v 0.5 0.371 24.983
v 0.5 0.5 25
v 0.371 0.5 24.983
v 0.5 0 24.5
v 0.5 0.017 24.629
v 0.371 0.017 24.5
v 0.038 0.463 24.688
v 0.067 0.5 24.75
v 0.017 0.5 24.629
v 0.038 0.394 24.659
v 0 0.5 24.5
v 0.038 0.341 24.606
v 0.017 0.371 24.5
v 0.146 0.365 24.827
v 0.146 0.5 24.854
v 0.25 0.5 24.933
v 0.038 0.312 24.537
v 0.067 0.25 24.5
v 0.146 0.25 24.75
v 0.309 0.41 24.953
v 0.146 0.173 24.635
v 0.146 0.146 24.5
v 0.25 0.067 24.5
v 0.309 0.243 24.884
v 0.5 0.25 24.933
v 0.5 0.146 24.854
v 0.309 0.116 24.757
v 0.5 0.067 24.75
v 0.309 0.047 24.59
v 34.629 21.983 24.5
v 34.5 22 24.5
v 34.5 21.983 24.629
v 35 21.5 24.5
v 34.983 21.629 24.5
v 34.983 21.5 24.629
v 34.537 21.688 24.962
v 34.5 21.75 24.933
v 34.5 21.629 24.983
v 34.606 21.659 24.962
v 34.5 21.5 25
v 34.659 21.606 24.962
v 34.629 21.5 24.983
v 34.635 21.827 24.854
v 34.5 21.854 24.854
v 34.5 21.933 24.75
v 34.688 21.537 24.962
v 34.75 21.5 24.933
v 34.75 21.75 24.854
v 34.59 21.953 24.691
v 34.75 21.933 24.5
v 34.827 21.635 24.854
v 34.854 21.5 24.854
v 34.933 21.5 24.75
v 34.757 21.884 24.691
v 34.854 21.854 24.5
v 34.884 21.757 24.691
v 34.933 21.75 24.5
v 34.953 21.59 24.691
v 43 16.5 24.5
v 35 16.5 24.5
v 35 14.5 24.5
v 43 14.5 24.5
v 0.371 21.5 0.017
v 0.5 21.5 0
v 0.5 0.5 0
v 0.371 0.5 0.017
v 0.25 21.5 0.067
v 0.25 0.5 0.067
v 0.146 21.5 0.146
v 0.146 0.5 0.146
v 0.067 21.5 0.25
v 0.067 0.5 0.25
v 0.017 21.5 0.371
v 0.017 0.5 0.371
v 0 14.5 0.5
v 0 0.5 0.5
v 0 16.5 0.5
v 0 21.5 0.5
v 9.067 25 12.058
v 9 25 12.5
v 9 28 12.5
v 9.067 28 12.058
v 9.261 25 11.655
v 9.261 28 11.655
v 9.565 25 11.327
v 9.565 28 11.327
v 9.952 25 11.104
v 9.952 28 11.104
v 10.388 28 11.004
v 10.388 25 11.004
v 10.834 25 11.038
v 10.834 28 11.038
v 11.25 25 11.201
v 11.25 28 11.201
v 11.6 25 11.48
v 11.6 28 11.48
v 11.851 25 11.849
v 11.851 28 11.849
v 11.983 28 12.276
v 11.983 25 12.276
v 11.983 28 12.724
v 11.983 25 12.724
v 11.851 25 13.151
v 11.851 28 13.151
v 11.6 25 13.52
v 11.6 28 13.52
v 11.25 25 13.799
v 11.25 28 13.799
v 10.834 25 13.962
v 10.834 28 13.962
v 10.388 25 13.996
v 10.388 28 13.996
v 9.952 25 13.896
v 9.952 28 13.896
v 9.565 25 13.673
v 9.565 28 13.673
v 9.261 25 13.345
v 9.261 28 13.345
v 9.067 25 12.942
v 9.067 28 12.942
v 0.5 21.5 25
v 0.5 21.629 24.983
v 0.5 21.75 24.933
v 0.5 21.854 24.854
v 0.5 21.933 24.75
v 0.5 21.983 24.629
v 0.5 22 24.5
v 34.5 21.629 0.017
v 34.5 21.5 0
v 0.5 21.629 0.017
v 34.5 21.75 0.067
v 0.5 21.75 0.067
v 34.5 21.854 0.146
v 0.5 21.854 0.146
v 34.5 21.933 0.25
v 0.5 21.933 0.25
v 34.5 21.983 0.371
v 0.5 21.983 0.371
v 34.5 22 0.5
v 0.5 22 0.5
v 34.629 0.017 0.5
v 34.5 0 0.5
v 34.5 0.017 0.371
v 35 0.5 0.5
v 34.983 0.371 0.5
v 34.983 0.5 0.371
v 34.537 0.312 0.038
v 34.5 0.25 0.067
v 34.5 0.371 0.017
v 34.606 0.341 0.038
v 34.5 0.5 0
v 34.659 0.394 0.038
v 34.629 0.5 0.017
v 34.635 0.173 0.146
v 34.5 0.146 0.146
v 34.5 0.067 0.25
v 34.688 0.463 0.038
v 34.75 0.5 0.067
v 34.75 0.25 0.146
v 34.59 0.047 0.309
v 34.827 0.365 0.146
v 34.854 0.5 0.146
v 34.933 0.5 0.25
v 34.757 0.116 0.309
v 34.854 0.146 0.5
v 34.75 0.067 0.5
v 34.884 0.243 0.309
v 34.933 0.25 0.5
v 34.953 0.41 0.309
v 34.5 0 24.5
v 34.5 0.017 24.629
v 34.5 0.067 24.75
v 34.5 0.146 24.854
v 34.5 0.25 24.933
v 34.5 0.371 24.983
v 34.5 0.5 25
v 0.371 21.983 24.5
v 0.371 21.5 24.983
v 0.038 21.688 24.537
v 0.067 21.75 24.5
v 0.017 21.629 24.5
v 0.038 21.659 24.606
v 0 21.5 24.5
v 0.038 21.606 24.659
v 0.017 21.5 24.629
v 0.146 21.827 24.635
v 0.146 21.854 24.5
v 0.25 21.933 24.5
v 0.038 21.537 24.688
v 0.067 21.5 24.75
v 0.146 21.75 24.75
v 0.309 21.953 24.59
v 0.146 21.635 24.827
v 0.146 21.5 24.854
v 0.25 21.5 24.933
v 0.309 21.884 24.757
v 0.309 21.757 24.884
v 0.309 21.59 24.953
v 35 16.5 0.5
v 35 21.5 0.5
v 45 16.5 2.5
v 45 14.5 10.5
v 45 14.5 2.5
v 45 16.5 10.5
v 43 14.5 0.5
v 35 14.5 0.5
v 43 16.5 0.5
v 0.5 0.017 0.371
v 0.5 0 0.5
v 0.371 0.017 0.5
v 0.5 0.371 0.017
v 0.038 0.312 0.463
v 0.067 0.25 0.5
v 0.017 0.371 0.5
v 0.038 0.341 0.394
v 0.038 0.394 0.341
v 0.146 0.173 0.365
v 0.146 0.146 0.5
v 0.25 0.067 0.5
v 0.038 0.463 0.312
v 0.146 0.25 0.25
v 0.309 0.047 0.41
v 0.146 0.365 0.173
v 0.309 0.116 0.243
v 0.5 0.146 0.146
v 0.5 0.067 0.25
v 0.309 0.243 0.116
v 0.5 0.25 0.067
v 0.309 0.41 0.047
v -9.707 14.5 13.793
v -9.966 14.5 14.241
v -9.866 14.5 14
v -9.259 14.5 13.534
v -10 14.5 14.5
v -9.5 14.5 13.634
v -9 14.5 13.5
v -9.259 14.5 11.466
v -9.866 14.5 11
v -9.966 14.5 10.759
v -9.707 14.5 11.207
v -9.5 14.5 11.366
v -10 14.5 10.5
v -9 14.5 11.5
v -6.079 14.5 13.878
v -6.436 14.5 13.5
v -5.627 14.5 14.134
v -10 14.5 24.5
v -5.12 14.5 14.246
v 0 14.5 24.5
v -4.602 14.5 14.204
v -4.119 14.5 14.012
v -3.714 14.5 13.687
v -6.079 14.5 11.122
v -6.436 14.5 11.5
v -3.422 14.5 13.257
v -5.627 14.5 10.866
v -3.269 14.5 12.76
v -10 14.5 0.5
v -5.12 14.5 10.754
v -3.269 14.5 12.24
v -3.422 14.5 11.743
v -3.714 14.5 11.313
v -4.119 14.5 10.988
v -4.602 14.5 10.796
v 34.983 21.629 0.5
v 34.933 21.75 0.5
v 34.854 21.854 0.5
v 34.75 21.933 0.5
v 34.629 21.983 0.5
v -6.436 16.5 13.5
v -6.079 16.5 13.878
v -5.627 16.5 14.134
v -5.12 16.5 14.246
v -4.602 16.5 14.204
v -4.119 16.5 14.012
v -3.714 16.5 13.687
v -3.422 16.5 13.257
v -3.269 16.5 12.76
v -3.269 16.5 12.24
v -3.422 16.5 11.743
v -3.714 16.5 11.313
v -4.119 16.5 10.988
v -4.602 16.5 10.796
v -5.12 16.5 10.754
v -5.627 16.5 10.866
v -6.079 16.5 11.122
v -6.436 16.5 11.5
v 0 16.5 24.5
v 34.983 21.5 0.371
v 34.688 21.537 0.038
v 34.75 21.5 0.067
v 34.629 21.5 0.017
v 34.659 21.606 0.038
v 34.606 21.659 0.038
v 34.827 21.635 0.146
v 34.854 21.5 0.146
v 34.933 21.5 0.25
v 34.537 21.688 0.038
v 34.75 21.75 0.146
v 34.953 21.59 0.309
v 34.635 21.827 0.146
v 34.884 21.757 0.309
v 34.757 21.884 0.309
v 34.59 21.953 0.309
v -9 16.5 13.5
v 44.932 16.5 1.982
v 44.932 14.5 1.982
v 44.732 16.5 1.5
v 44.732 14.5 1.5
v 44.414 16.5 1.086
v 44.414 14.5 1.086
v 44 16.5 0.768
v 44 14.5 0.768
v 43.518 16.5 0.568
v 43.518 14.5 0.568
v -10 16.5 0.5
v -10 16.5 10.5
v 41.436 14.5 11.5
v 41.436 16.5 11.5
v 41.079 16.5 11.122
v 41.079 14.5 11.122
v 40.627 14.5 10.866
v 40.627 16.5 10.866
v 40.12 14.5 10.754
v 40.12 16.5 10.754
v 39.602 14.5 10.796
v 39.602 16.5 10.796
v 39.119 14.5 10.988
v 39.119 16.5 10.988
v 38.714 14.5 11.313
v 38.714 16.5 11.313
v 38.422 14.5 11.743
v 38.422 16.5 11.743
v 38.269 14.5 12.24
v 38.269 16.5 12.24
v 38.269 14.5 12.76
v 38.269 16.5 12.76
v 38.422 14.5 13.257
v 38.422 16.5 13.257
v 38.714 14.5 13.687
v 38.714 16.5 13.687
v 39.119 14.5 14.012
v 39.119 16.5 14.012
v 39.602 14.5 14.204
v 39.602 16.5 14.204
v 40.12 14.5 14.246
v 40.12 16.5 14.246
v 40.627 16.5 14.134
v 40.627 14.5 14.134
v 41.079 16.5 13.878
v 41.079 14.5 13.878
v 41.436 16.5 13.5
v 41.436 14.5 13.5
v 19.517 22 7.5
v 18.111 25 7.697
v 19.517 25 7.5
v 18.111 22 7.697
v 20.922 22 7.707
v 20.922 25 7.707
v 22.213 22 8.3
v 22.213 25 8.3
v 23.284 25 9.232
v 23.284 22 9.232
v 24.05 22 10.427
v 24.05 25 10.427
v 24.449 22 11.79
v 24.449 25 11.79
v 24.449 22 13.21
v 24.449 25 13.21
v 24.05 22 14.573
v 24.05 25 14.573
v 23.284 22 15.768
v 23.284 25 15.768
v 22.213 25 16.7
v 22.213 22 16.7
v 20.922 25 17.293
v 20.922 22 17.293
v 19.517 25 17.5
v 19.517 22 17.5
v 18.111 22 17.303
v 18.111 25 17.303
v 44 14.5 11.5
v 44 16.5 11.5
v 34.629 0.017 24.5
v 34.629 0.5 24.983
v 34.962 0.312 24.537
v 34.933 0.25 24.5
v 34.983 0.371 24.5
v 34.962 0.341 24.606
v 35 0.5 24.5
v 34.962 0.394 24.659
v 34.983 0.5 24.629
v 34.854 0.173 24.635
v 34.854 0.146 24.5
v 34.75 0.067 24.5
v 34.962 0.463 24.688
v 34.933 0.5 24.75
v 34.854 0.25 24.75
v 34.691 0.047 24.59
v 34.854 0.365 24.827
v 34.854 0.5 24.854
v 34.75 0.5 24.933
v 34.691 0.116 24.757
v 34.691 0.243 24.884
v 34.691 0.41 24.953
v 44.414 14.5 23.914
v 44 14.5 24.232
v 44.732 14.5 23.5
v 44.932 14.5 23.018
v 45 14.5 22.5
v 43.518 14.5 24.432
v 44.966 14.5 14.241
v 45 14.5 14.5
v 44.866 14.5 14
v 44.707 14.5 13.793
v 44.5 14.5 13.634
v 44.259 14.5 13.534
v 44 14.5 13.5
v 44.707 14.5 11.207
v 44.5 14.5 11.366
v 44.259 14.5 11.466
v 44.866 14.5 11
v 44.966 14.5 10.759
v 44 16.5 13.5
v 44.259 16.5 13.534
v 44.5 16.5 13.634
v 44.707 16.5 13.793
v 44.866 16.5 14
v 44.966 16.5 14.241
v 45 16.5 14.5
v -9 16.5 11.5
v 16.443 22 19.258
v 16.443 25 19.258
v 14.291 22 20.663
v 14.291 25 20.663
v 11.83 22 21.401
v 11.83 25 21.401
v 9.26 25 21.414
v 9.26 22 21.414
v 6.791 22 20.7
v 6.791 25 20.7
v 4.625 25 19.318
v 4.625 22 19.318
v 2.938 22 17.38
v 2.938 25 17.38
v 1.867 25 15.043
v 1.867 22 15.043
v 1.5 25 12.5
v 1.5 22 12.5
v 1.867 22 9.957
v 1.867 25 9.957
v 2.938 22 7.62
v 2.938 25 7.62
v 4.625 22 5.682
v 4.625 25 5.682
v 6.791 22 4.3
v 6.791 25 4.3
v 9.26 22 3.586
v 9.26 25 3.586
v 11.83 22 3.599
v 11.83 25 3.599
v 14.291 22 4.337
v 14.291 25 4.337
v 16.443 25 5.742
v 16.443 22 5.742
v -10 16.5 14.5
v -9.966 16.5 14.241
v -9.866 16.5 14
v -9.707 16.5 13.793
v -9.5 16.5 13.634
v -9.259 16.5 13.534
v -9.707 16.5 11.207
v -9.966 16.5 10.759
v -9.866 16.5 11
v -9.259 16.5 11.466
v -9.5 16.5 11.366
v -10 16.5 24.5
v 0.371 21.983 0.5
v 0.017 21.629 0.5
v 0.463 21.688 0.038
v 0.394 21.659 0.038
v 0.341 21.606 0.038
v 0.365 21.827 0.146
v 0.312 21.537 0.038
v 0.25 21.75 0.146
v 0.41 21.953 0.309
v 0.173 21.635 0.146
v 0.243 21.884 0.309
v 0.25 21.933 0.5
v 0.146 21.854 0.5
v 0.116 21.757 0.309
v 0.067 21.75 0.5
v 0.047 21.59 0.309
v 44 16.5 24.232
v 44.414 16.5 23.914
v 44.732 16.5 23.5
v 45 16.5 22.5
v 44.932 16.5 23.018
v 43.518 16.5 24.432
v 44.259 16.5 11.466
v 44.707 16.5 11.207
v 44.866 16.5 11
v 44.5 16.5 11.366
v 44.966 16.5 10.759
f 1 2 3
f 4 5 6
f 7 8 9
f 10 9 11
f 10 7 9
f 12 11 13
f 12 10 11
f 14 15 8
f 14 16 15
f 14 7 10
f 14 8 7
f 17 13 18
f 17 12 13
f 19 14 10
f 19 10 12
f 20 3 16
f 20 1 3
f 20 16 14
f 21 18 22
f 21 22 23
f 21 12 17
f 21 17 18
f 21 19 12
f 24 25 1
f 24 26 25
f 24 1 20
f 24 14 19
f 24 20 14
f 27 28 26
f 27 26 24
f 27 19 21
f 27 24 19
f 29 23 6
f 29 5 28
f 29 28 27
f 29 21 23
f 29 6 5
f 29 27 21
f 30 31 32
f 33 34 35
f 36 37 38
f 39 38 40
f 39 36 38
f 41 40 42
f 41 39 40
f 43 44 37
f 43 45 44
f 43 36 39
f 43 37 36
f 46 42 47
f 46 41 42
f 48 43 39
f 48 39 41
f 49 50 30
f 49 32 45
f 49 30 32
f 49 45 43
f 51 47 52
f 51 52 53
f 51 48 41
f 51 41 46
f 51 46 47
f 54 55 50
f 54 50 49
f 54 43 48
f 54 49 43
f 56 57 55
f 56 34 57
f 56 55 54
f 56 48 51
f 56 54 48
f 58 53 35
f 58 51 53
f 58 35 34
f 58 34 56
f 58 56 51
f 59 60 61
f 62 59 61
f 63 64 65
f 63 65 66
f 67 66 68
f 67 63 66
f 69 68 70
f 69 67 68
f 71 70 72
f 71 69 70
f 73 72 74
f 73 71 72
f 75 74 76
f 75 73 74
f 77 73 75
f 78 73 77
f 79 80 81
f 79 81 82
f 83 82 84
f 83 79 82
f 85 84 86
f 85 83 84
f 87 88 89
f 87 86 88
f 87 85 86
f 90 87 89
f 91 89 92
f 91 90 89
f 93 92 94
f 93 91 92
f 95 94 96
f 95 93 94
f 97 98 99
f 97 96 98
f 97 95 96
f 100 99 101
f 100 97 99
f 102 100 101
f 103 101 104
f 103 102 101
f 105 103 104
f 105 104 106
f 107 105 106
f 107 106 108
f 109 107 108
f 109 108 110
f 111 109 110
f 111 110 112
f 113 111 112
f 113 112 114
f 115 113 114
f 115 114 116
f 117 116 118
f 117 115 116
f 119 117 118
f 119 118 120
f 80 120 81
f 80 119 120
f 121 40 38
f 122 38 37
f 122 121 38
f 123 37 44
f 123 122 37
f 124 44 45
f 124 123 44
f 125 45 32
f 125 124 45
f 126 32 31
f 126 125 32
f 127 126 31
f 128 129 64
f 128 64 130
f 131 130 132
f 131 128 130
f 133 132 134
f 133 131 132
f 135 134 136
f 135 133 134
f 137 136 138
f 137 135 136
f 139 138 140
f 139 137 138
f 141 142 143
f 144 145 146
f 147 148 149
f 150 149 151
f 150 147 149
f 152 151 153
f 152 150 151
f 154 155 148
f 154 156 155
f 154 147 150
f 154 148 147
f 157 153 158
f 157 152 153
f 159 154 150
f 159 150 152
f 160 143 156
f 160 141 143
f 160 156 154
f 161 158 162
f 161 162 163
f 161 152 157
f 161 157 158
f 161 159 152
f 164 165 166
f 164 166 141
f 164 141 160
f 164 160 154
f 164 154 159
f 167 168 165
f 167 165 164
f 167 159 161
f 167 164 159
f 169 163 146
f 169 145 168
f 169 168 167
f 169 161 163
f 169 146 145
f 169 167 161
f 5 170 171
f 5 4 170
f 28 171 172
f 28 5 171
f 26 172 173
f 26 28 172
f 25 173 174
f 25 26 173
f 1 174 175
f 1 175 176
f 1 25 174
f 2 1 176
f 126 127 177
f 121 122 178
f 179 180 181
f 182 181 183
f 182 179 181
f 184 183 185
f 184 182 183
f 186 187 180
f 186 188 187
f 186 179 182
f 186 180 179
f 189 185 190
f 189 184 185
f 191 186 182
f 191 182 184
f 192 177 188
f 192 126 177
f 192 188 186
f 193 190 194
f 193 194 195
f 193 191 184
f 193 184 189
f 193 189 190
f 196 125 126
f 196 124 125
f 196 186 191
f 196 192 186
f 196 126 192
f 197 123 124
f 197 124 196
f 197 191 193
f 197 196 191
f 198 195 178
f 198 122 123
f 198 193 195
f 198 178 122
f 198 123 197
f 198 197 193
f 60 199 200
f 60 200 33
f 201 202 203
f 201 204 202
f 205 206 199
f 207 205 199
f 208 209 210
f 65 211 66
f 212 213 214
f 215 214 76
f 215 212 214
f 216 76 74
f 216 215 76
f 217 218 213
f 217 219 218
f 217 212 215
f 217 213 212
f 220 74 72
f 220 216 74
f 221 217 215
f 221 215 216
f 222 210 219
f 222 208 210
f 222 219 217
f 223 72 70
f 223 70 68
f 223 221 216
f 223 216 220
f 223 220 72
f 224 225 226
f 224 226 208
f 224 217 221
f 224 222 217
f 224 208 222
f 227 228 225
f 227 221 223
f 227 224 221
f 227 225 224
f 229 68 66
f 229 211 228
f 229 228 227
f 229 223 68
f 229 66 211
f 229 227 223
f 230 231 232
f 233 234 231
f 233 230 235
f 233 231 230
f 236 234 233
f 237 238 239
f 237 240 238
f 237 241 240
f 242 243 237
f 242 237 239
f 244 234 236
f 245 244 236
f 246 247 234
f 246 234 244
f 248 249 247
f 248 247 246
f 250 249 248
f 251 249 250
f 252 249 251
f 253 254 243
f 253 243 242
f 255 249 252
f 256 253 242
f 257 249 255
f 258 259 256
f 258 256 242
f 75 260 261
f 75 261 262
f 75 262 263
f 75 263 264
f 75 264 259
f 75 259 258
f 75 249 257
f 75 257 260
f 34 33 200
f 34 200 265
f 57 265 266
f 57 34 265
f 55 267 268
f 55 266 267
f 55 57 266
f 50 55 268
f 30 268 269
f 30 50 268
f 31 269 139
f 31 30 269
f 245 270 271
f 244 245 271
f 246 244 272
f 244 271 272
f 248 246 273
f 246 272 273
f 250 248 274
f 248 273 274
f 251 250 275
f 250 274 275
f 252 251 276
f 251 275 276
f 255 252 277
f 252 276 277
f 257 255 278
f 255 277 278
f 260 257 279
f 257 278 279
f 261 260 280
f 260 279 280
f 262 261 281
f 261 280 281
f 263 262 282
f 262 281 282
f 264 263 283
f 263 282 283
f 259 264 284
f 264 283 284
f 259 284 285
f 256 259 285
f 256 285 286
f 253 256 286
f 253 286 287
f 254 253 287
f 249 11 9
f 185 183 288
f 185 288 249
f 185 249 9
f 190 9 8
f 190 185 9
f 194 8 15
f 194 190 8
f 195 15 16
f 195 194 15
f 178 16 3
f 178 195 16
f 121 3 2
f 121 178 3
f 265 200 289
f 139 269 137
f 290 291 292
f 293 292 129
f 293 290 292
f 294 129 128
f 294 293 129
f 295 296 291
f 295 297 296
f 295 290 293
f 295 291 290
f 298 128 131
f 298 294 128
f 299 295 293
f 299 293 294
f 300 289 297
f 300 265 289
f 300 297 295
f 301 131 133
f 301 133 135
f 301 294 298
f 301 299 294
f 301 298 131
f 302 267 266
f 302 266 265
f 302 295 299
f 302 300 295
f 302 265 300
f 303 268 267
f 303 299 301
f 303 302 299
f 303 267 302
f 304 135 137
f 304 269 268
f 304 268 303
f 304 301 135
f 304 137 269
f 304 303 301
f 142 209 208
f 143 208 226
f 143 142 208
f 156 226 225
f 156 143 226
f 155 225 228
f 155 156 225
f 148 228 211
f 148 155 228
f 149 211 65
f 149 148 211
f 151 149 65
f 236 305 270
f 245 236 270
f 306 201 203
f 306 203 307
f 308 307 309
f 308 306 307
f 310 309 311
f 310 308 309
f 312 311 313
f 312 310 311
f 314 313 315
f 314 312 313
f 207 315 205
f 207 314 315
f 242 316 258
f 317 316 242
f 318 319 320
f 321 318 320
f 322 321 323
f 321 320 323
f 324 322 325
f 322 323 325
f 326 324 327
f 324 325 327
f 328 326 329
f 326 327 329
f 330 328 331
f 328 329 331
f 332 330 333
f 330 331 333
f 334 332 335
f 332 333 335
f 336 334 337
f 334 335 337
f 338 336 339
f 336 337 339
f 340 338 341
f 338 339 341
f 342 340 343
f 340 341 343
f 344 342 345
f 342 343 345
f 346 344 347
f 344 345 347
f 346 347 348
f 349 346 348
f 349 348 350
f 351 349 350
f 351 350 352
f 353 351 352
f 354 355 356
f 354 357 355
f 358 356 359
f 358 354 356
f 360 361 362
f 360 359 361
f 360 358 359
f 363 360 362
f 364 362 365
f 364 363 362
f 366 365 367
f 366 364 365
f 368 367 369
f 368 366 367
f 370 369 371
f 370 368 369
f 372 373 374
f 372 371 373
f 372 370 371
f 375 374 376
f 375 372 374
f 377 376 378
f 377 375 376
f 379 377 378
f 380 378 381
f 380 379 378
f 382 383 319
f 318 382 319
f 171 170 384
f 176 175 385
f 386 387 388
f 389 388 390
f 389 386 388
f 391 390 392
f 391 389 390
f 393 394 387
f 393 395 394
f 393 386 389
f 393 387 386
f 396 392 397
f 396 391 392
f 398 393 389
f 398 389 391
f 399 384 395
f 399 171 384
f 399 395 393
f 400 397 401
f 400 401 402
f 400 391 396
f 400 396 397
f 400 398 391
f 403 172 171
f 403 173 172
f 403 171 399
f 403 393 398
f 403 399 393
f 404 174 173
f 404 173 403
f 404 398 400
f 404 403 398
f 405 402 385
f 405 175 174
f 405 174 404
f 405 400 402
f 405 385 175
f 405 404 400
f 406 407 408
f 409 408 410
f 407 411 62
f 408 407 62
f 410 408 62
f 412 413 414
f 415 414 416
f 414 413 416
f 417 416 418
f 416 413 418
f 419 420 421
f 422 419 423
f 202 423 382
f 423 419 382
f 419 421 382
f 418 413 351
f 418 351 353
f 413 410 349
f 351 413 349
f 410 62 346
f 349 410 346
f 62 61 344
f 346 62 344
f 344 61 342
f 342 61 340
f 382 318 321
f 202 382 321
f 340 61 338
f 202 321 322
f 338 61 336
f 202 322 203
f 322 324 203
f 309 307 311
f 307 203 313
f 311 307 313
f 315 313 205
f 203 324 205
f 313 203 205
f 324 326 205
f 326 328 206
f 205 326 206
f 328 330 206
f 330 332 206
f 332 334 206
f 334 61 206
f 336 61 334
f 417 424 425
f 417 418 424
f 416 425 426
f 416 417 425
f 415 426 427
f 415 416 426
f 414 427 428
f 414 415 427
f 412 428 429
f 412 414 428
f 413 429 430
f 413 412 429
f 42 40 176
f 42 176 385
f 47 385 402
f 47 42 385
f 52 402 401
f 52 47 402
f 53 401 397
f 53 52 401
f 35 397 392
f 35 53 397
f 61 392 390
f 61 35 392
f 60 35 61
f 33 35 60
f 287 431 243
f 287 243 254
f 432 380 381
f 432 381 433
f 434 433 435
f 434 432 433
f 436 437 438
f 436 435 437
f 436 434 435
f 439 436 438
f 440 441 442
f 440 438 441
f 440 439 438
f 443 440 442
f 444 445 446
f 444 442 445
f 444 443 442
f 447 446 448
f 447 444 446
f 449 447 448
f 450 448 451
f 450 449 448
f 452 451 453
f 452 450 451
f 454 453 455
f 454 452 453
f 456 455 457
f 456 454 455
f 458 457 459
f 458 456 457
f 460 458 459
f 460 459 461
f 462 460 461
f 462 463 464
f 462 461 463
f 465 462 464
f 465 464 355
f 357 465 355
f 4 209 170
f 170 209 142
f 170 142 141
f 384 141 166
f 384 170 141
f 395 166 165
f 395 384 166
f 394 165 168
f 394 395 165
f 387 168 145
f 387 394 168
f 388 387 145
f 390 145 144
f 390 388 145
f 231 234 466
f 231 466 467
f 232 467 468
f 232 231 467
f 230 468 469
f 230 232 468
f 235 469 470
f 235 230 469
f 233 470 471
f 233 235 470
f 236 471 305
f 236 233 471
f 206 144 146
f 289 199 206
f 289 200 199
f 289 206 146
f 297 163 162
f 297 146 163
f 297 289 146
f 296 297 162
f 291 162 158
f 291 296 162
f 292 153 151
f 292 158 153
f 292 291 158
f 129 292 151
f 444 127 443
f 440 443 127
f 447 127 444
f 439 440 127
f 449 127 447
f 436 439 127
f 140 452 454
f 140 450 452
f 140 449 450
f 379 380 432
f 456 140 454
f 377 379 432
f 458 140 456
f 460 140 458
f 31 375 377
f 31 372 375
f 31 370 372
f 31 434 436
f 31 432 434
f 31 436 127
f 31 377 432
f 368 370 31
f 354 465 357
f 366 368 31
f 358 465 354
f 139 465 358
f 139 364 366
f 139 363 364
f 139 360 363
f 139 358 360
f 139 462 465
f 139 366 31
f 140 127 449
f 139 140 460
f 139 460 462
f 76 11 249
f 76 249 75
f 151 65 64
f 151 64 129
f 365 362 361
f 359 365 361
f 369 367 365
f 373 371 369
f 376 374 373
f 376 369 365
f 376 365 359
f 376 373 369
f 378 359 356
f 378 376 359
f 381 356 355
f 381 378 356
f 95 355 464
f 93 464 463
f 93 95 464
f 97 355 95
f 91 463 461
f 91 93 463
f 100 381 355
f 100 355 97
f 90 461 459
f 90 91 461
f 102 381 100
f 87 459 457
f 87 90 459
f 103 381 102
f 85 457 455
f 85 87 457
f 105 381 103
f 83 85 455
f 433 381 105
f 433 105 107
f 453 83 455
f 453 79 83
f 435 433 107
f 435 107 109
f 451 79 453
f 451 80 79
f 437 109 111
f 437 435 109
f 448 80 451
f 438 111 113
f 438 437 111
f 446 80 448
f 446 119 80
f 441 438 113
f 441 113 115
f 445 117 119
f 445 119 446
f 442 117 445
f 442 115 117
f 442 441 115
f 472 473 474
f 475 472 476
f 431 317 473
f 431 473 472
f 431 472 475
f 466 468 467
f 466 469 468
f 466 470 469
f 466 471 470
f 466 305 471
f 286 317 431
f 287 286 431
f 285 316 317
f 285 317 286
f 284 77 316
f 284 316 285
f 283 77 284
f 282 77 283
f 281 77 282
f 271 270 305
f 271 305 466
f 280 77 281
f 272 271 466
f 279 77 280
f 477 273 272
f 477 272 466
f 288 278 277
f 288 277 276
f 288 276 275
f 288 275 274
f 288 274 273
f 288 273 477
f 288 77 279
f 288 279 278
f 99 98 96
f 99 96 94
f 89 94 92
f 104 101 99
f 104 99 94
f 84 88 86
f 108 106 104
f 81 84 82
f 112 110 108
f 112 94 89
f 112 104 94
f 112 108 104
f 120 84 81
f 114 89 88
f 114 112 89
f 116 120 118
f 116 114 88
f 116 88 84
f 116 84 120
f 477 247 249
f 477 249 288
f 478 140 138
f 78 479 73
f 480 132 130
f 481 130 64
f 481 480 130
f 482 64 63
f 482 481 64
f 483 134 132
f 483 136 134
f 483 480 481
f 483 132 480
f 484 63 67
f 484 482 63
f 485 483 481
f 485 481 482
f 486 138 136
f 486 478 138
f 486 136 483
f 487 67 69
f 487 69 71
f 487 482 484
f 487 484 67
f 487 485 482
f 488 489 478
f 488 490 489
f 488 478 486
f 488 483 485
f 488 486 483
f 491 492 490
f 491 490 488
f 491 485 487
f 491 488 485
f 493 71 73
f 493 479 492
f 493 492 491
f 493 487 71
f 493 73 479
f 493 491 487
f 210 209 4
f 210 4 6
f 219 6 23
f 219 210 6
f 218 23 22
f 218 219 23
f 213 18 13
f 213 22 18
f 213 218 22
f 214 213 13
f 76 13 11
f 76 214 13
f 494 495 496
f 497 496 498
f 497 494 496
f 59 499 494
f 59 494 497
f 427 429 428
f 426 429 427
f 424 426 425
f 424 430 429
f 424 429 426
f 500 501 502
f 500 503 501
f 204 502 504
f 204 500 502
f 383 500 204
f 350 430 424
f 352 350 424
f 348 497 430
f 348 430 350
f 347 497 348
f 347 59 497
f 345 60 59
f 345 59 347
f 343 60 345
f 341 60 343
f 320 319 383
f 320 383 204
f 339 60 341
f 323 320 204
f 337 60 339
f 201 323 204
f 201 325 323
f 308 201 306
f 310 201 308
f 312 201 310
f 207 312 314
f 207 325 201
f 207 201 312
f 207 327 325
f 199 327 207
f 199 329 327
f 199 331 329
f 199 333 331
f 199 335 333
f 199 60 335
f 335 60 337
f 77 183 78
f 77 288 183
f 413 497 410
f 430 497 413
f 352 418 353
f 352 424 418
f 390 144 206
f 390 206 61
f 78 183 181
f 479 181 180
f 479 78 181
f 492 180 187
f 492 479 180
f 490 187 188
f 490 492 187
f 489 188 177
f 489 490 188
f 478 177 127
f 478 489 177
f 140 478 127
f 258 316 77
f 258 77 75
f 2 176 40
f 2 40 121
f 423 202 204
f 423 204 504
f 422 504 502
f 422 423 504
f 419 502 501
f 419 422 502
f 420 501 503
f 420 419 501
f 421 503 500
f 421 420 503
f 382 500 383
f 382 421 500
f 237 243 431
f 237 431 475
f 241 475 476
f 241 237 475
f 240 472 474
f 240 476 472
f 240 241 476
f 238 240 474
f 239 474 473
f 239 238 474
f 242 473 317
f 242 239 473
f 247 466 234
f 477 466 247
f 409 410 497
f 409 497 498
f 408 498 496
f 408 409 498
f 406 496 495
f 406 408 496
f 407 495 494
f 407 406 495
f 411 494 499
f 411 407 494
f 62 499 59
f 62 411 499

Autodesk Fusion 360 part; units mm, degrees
sketch "Sketch1" plane through (0, 0, 0) normal (0, 1, 0) x (1, 0, 0)
  line L0 (0, 0) -> (35, 0)
  line L1 (35, 0) -> (35, -25)
  line L2 (35, -25) -> (0, -25)
  line L3 (0, -25) -> (0, 0)
  dimension "d1" = 35
  dimension "d2" = 25
extrude "Extrude1" add sketch "Sketch1" along normal blind 22 makes body 1
fillet "Fillet1" radius 0.5 12 edges at (35, 22, 12.5) (17.5, 22, 25) (0, 22, 12.5) (17.5, 22, 0) (17.5, 0, 25) (35, 0, 12.5) (35, 11, 0) (35, 11, 25) (17.5, 0, 0) (0, 11, 0) (0, 11, 25) (0, 0, 12.5) on bodies 1
sketch "Sketch2" plane through (0, 22, 0) normal (0, 1, 0) x (-1, 0, 0)
  line L0 (-34.5, 0.5) -> (-0.5, 0.5)
  line L1 (-0.5, 0.5) -> (-0.5, 24.5)
  line L2 (-0.5, 24.5) -> (-34.5, 24.5)
  line L3 (-34.5, 24.5) -> (-34.5, 0.5)
  arc A0 (-18.1111, 17.3032) -> (-18.1111, 7.6968) centre (-19.5, 12.5) ccw
  arc A1 (-18.1111, 7.6968) -> (-18.1111, 17.3032) centre (-10.5, 12.5) ccw
  dimension "d8" = 18
extrude "Extrude2" add sketch "Sketch2" along normal blind 3 contours A0 A1 bodies 1
sketch "Sketch3" plane through (0, 25, 0) normal (0, 1, 0) x (-1, 0, 0)
  arc A0 (-18.1111, 7.6968) -> (-18.1111, 17.3032) centre (-10.5, 12.5) ccw
  arc A1 (-18.1111, 17.3032) -> (-18.1111, 7.6968) centre (-19.5, 12.5) ccw
  circle A2 centre (-10.5, 12.5) radius 1.5
  dimension "d20" = 3
extrude "Extrude3" add sketch "Sketch3" along normal blind 3 contours A2 bodies 1
thread "Thread1"
sketch "Sketch4" plane through (35, 0, 0) normal (1, 0, 0) x (0, 0, -1)
  line L0 (-24.5, 0.5) -> (-0.5, 0.5)
  line L1 (-0.5, 0.5) -> (-0.5, 21.5)
  line L2 (-0.5, 21.5) -> (-24.5, 21.5)
  line L3 (-24.5, 21.5) -> (-24.5, 0.5)
  line L4 (-12.5, 21.5) -> (-12.5, 16.5)
  line L5 (-12.5, 16.5) -> (-24.5, 16.5)
  line L6 (-12.5, 16.5) -> (-0.5, 16.5)
  line L7 (-24.5, 16.5) -> (-24.5, 14.5)
  line L8 (-24.5, 14.5) -> (-0.5, 14.5)
  line L9 (-0.5, 14.5) -> (-0.5, 16.5)
  dimension "d23" = 5
  dimension "d24" = 12
  dimension "d25" = 12
  dimension "d26" = 2
  dimension "d27" = 24
extrude "Extrude4" add sketch "Sketch4" along normal blind 10 contours L1 L3 L5 L6 L7 L8 L9 bodies 1
fillet "Fillet2" radius 2 2 edges at (45, 15.5, 24.5) (45, 15.5, 0.5) on bodies 1
sketch "Sketch5" plane through (0, 16.5, 0) normal (0, 1, 0) x (-1, 0, 0)
  arc A0 (-45, 2.5) -> (-43, 0.5) centre (-43, 2.5) ccw
  line L0 (-43, 0.5) -> (-35, 0.5)
  line L1 (-35, 0.5) -> (-35, 24.5)
  line L2 (-35, 24.5) -> (-43, 24.5)
  arc A1 (-43, 24.5) -> (-45, 22.5) centre (-43, 22.5) ccw
  line L3 (-45, 22.5) -> (-45, 2.5)
  line L4 (-45, 12.5) -> (-45, 11.5)
  line L5 (-45, 12.5) -> (-45, 13.5)
  line L6 (-45, 13.5) -> (-41.4361, 13.5)
  line L7 (-45, 11.5) -> (-41.4361, 11.5)
  arc A2 (-41.4361, 11.5) -> (-41.4361, 13.5) centre (-40, 12.5) ccw
  dimension "d32" = 5
  dimension "d33" = 3.5
  dimension "d34" = 1
  dimension "d35" = 1
extrude "Extrude5" cut sketch "Sketch5" against normal blind 6.2 contours L3 L4 L5 L6 L7 A2 bodies 1
fillet "Fillet3" radius 1 2 edges at (45, 15.5, 11.5) (45, 15.5, 13.5) on bodies 1
sketch "Sketch6" plane through (0, 0, 0) normal (-1, 0, 0) x (0, 0, 1)
  line L0 (24.5, 0.5) -> (24.5, 21.5)
  line L1 (24.5, 21.5) -> (0.5, 21.5)
  line L2 (0.5, 21.5) -> (0.5, 0.5)
  line L3 (0.5, 0.5) -> (24.5, 0.5)
  line L4 (0.5, 16.5) -> (24.5, 16.5)
  line L5 (24.5, 16.5) -> (24.5, 14.5)
  line L6 (24.5, 14.5) -> (0.5, 14.5)
  line L7 (0.5, 14.5) -> (0.5, 16.5)
  dimension "d40" = 5
  dimension "d41" = 24
  dimension "d42" = 2
extrude "Extrude6" add sketch "Sketch6" along normal blind 10 contours L0 L2 L4 L5 L6 L7 bodies 1
sketch "Sketch7" plane through (0, 16.5, 0) normal (0, 1, 0) x (-1, 0, 0)
  line L0 (0, 24.5) -> (0, 0.5)
  line L1 (0, 0.5) -> (10, 0.5)
  line L2 (10, 0.5) -> (10, 24.5)
  line L3 (10, 24.5) -> (0, 24.5)
  line L4 (0, 12.5) -> (5, 12.5)
  line L5 (10, 12.5) -> (10, 11.5)
  line L6 (10, 12.5) -> (10, 13.5)
  line L7 (10, 11.5) -> (6.4361, 11.5)
  line L8 (10, 13.5) -> (6.4361, 13.5)
  arc A0 (6.4361, 13.5) -> (6.4361, 11.5) centre (5, 12.5) ccw
  dimension "d45" = 5
  dimension "d46" = 3.5
  dimension "d47" = 1
  dimension "d48" = 1
extrude "Extrude7" cut sketch "Sketch7" against normal blind 6.5 contours L2 L5 L6 L7 L8 A0 bodies 1
fillet "Fillet4" radius 1 2 edges at (-10, 15.5, 13.5) (-10, 15.5, 11.5) on bodies 1
copy_body "Body->Comp1" bodies 1 removing the originals makes body 2 in component "Component"
component "Component" placed x (1, 0, 0) y (0, 1, 0) z (0, 0, 1) at (0, 0, 0)
